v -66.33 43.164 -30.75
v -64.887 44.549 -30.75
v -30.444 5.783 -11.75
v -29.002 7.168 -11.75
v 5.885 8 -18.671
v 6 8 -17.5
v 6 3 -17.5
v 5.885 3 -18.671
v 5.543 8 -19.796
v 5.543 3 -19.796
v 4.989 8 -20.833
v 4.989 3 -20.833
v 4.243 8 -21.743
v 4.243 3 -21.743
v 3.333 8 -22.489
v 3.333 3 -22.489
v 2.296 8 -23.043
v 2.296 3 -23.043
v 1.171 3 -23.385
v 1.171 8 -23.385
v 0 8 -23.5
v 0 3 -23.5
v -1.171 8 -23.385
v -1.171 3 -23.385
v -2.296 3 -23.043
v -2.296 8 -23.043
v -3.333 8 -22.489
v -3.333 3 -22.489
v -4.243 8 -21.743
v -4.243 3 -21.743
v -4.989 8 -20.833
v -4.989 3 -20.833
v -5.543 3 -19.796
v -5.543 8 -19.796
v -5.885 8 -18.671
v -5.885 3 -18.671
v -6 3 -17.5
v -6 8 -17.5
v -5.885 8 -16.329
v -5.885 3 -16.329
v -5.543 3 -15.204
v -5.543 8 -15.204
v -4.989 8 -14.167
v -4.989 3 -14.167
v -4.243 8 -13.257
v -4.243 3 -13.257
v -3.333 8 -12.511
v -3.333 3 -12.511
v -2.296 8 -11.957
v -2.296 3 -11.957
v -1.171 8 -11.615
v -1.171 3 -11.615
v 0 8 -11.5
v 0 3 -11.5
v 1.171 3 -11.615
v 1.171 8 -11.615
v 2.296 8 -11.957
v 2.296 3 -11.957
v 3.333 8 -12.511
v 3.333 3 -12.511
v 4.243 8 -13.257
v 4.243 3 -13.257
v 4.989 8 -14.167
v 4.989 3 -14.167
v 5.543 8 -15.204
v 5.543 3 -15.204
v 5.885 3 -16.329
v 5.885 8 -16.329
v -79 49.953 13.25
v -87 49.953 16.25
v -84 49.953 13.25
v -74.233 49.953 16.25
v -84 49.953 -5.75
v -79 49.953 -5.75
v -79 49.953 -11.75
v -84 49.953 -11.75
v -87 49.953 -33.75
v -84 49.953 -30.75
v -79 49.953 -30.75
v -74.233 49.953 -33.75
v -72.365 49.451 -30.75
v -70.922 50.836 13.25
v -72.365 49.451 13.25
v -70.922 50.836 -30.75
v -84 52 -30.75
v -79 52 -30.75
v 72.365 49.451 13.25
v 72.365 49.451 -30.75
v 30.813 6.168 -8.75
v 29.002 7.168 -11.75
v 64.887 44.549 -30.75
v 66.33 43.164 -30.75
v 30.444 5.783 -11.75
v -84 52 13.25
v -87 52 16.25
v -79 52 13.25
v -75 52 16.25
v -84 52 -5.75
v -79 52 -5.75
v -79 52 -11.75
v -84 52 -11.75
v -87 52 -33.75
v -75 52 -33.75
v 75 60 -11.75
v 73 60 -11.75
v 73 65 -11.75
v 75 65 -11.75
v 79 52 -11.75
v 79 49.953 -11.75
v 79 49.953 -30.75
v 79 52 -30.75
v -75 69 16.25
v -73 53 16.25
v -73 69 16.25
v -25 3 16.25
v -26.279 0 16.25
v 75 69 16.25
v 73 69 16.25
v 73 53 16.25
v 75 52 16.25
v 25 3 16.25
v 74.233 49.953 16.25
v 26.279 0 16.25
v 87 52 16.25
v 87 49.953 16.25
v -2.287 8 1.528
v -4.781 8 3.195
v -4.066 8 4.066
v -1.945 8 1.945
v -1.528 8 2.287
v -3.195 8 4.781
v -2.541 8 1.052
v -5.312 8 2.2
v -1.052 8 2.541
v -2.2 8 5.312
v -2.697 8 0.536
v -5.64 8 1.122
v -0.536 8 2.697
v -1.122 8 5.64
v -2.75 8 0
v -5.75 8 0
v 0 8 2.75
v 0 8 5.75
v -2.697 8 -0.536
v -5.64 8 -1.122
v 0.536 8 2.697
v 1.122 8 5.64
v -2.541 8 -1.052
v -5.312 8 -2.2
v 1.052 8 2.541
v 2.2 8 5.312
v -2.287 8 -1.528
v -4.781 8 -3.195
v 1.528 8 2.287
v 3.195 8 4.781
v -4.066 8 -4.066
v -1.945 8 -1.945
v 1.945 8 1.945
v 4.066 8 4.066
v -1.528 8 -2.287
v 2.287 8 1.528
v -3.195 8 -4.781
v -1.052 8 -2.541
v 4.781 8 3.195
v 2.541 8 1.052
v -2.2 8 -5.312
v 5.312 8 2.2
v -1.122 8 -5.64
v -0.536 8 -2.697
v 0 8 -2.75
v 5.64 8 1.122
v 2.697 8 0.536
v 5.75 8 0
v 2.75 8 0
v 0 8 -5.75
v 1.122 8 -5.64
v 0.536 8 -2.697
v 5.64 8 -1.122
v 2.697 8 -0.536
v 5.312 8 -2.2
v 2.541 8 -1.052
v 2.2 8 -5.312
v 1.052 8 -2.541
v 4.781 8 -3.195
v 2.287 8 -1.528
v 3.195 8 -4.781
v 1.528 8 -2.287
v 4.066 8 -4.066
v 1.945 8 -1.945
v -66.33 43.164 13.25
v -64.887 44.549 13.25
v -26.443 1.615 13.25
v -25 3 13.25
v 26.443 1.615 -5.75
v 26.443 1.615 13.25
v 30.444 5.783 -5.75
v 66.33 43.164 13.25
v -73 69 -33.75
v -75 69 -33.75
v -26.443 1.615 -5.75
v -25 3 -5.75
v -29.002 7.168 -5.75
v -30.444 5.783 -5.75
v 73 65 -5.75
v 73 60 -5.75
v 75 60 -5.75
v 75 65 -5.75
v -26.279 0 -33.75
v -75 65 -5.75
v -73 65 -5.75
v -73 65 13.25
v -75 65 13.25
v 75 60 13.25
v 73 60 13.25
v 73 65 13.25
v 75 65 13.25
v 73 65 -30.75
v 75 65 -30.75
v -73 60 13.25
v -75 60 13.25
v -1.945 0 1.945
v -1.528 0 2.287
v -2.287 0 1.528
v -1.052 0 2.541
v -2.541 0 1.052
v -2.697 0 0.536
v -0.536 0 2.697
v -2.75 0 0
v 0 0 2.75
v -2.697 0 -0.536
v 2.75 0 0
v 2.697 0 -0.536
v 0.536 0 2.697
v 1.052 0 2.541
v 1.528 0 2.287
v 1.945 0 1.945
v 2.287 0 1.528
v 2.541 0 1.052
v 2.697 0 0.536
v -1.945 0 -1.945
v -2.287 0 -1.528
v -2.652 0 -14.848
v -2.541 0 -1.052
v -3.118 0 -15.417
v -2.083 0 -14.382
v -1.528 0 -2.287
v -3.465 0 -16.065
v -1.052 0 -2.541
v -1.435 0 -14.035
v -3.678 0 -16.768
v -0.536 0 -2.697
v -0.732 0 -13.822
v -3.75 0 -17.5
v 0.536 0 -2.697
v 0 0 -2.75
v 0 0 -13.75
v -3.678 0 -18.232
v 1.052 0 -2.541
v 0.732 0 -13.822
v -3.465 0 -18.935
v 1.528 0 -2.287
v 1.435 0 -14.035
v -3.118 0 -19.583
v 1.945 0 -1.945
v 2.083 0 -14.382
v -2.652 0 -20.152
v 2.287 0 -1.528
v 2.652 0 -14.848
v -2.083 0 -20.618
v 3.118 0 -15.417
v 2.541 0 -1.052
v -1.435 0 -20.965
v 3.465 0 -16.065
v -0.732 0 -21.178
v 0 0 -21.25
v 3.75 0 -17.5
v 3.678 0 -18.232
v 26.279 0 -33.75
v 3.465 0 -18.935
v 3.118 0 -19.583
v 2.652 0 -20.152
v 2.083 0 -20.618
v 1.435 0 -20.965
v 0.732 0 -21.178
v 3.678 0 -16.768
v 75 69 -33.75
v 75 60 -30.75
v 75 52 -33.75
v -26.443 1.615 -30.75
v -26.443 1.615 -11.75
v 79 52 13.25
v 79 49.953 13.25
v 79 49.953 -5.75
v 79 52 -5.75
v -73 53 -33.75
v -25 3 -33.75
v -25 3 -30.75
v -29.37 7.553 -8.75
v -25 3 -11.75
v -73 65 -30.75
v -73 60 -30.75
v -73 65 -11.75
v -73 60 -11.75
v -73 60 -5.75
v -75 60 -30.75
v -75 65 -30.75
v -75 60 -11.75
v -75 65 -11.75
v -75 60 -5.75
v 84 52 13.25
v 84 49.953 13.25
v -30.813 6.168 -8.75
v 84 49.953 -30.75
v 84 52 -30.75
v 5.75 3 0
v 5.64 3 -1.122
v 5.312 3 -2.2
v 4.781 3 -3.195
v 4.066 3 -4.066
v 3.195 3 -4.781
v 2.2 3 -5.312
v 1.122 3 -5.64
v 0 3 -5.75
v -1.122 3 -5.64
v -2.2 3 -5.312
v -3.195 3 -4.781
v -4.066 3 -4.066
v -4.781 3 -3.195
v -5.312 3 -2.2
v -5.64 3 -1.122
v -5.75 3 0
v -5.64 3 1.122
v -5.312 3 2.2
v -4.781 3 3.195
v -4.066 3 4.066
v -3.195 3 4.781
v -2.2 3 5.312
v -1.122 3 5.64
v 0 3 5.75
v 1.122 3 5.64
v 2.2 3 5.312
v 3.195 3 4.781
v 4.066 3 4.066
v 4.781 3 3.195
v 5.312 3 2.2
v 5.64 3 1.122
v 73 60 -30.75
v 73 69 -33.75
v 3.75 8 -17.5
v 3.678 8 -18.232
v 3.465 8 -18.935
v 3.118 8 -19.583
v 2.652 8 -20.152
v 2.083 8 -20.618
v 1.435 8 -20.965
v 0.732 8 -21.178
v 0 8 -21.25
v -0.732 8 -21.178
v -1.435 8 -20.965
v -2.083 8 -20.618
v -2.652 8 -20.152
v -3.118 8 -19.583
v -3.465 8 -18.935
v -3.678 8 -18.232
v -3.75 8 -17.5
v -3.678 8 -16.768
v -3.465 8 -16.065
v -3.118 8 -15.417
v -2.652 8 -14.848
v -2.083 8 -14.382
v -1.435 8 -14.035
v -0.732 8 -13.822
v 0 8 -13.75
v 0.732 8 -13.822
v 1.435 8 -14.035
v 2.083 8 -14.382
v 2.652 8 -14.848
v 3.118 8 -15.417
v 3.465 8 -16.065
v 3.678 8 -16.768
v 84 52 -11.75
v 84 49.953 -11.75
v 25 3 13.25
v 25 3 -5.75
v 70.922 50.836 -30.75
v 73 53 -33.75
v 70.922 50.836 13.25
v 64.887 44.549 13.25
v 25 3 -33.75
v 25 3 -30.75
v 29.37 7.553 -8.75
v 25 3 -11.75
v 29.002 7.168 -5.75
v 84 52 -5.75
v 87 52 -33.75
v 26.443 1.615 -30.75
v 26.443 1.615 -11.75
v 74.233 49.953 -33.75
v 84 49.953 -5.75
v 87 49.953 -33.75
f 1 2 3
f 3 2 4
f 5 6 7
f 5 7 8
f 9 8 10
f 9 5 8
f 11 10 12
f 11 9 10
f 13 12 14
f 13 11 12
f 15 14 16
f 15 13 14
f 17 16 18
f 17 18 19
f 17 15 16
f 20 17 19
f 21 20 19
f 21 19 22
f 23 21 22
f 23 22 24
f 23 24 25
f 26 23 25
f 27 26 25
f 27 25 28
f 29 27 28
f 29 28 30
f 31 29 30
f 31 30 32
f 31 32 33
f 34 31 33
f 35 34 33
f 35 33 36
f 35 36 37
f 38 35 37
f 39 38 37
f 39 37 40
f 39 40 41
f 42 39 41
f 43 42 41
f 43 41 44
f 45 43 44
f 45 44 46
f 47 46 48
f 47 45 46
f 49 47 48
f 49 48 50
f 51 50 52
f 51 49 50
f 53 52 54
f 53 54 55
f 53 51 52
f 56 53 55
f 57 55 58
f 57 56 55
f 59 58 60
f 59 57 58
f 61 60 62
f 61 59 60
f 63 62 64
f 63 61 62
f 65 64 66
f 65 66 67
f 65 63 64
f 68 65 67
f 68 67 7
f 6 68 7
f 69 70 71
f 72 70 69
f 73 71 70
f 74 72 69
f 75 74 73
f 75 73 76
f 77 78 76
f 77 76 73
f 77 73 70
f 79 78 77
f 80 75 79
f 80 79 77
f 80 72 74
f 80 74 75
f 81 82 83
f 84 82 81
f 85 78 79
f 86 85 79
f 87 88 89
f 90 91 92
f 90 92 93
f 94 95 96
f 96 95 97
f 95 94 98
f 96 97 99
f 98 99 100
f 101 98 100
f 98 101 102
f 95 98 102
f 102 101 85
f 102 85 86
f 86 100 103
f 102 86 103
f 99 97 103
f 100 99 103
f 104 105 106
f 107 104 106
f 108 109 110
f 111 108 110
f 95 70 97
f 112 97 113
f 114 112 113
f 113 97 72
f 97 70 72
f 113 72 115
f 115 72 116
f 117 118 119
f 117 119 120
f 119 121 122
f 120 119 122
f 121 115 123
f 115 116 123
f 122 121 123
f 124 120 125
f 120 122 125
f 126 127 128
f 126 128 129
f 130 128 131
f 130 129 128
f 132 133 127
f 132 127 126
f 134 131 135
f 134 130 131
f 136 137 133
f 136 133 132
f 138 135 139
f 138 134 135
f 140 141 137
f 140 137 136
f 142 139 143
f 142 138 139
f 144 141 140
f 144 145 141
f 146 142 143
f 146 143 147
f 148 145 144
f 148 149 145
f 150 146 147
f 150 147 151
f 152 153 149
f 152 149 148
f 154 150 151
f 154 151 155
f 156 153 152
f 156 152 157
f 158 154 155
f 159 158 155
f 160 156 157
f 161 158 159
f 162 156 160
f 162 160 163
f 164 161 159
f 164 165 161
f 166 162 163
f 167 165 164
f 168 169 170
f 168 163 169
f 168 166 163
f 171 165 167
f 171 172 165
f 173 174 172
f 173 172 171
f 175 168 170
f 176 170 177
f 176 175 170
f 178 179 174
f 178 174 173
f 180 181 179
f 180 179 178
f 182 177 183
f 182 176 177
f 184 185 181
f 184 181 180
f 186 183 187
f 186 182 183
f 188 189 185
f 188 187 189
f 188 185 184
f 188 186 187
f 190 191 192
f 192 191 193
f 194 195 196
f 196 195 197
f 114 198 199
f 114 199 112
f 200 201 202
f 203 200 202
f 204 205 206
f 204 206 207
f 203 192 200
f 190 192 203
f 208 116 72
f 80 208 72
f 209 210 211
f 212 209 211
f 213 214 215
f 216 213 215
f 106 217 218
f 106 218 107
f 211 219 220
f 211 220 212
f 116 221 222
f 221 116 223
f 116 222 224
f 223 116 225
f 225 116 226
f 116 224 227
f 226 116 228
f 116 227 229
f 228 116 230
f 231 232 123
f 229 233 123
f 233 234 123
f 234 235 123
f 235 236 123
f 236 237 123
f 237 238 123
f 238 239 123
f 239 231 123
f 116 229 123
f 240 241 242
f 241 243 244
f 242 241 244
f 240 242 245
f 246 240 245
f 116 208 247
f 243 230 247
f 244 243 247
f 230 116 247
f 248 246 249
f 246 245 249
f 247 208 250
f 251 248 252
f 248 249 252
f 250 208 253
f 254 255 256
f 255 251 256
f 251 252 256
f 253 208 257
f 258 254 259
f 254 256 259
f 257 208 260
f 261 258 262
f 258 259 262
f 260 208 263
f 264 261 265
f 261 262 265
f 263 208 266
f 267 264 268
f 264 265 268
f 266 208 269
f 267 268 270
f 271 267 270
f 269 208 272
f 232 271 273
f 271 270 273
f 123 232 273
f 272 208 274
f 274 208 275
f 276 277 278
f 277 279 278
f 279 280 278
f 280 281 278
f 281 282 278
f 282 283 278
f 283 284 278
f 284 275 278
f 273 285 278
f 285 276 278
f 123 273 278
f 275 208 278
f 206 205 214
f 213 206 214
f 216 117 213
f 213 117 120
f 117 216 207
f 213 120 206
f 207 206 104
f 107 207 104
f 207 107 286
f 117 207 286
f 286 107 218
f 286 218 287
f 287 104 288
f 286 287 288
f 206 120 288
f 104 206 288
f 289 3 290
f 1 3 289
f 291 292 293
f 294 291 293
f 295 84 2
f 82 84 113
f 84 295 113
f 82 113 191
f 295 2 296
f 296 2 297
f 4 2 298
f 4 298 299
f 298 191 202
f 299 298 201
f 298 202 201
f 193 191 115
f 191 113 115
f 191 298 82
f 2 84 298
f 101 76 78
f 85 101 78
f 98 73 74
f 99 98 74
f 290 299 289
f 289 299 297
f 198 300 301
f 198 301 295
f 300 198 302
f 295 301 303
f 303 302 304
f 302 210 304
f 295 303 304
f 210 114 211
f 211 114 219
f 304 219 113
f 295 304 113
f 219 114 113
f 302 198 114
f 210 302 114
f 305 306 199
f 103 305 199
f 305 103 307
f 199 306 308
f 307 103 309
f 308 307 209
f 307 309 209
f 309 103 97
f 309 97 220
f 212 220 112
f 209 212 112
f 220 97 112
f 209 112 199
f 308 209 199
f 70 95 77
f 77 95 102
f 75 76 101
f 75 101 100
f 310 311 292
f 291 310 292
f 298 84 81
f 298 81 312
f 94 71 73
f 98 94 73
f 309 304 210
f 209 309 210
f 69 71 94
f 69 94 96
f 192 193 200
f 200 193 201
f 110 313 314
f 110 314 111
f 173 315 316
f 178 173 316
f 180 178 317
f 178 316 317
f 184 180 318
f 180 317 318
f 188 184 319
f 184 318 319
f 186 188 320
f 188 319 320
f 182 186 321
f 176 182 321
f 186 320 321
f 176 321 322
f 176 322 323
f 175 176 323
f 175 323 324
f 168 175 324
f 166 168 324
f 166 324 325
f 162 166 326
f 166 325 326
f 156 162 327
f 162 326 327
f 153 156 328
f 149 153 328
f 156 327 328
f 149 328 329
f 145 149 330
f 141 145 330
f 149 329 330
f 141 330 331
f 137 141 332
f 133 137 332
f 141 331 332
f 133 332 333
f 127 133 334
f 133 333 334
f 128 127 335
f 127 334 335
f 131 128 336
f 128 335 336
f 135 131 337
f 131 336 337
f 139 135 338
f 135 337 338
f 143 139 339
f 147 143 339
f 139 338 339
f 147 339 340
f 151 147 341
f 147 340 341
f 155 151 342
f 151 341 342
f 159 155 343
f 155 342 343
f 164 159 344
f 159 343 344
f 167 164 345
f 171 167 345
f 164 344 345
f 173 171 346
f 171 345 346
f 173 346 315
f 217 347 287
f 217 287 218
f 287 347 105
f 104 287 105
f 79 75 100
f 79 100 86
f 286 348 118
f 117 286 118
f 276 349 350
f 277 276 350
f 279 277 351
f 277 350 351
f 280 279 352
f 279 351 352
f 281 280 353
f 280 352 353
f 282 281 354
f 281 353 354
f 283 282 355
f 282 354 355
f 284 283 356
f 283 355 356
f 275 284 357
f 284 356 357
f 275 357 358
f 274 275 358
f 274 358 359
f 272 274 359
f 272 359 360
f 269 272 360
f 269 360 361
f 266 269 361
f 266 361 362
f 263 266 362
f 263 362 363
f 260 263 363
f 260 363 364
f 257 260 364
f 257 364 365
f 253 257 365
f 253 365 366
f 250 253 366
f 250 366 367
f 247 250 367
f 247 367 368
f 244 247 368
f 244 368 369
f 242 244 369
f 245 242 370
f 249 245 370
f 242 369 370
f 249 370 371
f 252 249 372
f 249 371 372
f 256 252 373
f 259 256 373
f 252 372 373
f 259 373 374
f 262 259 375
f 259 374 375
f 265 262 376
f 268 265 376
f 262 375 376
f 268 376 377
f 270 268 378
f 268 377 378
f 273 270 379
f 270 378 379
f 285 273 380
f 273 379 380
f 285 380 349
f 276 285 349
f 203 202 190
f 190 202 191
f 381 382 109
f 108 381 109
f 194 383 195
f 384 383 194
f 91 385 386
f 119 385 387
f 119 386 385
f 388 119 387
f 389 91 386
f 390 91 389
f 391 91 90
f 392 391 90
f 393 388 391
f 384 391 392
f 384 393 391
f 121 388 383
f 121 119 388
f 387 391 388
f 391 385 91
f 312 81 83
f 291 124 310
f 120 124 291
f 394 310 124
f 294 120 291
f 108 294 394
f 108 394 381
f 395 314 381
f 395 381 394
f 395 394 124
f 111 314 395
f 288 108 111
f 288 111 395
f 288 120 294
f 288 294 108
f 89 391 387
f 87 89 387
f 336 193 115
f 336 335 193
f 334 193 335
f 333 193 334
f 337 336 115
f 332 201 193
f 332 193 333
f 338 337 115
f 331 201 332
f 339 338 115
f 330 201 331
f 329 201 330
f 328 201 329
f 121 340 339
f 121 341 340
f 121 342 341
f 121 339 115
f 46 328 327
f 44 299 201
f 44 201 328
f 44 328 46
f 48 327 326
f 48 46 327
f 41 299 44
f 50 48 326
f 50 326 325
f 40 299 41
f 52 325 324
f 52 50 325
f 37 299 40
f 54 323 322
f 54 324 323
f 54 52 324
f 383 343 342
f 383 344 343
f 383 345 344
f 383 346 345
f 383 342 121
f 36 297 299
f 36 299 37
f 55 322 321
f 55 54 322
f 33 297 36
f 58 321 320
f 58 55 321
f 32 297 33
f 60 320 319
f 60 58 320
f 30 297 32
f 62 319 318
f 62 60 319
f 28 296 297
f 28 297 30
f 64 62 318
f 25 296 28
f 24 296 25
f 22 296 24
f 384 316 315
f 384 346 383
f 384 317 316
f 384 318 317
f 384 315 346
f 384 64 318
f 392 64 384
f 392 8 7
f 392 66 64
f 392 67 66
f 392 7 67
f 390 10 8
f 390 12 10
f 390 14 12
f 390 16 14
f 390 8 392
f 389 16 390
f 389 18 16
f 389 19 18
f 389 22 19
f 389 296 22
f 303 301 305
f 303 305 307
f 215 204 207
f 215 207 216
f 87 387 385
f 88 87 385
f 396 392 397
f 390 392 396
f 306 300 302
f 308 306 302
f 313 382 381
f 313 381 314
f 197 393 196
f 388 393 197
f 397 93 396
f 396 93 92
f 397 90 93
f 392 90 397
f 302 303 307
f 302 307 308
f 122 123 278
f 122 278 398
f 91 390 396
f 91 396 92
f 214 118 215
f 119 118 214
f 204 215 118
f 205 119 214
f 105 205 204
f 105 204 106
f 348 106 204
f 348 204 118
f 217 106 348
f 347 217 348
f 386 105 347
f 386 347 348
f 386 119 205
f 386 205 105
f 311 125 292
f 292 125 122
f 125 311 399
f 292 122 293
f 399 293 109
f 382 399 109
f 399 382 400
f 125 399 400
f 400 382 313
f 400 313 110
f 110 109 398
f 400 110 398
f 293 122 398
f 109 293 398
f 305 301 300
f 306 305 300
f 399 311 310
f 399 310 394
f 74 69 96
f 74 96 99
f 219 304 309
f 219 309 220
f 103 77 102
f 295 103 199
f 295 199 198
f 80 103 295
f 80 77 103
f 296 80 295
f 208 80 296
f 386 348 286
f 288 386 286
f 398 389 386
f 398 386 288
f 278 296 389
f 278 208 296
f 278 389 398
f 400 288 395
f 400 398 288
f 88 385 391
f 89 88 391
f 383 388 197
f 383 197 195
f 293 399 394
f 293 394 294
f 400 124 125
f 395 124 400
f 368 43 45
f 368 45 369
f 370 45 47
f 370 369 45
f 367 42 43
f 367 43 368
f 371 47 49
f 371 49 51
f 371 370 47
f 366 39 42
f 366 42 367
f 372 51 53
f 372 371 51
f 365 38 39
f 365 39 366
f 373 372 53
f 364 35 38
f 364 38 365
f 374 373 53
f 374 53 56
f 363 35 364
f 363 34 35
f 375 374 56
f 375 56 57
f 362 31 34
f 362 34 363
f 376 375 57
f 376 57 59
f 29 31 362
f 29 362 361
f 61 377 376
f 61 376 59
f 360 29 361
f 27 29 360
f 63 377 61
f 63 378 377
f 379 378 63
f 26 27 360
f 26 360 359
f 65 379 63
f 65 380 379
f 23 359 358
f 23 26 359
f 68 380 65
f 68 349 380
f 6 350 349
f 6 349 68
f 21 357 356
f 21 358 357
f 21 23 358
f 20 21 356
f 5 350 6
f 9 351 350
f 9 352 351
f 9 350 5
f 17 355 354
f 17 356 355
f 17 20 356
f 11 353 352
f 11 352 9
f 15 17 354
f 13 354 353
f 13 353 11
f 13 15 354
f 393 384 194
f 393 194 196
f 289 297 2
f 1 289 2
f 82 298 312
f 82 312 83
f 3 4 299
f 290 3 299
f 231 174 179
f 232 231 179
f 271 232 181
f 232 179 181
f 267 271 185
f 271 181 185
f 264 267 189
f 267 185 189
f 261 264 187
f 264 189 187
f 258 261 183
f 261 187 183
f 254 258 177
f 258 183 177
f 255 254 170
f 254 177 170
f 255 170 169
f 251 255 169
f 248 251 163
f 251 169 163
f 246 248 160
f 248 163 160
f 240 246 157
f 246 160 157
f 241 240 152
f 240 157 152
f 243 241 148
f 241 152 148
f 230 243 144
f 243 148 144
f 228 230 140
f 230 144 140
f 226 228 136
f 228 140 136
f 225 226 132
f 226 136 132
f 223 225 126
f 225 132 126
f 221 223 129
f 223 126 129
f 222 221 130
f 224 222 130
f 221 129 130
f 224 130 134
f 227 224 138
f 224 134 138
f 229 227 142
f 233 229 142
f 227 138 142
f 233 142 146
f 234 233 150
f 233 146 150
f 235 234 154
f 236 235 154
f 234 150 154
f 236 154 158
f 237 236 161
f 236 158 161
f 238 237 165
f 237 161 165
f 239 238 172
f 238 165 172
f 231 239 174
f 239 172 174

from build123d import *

# Parameters (mm, degrees)
SKETCH1_W               = 50
SKETCH1_H               = 50
SKETCH1_R               = 3.75
SKETCH1_R_2             = 2.75
BOSS_EXTRUDE1_DEPTH     = 3
BOSS_EXTRUDE2_DEPTH     = 50
CUT_EXTRUDE2_DEPTH      = 2
SKETCH10_W              = 50
SKETCH10_H              = 2.047418662
BOSS_EXTRUDE6_DEPTH     = 2
SKETCH11_W              = 5
SKETCH11_H              = 19
CUT_EXTRUDE4_DEPTH      = 4
SKETCH12_W              = 2
SKETCH12_H              = 50
BOSS_EXTRUDE7_DEPTH     = 10
SKETCH13_W              = 19
SKETCH13_H              = 5
CUT_EXTRUDE5_DEPTH      = 10
SKETCH14_R              = 5.75
SKETCH14_R_2            = 3.75
SKETCH14_R_3            = 4.75
SKETCH14_R_4            = 2.75
BOSS_EXTRUDE8_DEPTH     = 5
SKETCH15_W              = 50
SKETCH15_H              = 3
CUT_EXTRUDE6_DEPTH      = 161
CUT_EXTRUDE6_DEPTH_BACK = 15
SKETCH16_R              = 3.75
SKETCH16_R_2            = 2.75
BOSS_EXTRUDE9_DEPTH     = 8
SKETCH17_R              = 3.75
CUT_EXTRUDE7_DEPTH      = 9
SKETCH18_R              = 6
SKETCH18_R_2            = 4.75
BOSS_EXTRUDE10_DEPTH    = 8


with BuildPart() as part:
    # Sketch1 → Boss-Extrude1 (new body)
    with BuildSketch(Plane(origin=(0, 0, 0), x_dir=(1, 0, 0), z_dir=(0, 1, 0))):
        with Locations((0, 8.75)):
            Rectangle(SKETCH1_W, SKETCH1_H)
        Circle(SKETCH1_R, mode=Mode.SUBTRACT)
        with Locations((0, 17.5)):
            Circle(SKETCH1_R_2, mode=Mode.SUBTRACT)
    extrude(amount=BOSS_EXTRUDE1_DEPTH)

    # Sketch2 → Boss-Extrude2 (add)
    with BuildSketch(Plane.XY.offset(16.25)):
        Polygon((-25, 0), (-26.278653628, 0), (-74.233131713, 49.952581338), (-85, 49.952581338), (-85, 52), (-75, 52), (-75, 62), (-73, 62), (-73, 53), (-25, 3), align=None)
    boss_extrude2 = extrude(amount=-BOSS_EXTRUDE2_DEPTH)

    # Sketch3 → Cut-Extrude2 (cut)
    with BuildSketch(Plane(origin=(-11.511240633, -11.050791007, 0), x_dir=(0, 0, -1), z_dir=(0.721387321, 0.692531828, 0))):
        Polygon((-13.25, 85.788351472), (30.75, 85.788351472), (8.75, 25.788351472), align=None)
        Polygon((30.75, 77.073872213), (11.75, 25.255690395), (11.75, 19.477457668), (30.75, 19.477457668), (30.75, 22.897932802), align=None)
        Polygon((-13.25, 77.073872213), (-13.25, 19.477457668), (5.75, 19.477457668), (5.75, 25.255690395), align=None)
    cut_extrude2 = extrude(amount=-CUT_EXTRUDE2_DEPTH, mode=Mode.SUBTRACT)

    # Mirror1: Boss-Extrude2, Cut-Extrude2 across plane
    add(boss_extrude2.mirror(Plane(origin=(0, 0, 0), x_dir=(0, 0, 1), z_dir=(1, 0, 0))))
    add(cut_extrude2.mirror(Plane(origin=(0, 0, 0), x_dir=(0, 0, 1), z_dir=(1, 0, 0))), mode=Mode.SUBTRACT)

    # Sketch10 → Boss-Extrude6 (add)
    with BuildSketch(Plane(origin=(85, 0, 0), x_dir=(0, 0, -1), z_dir=(1, 0, 0))):
        with Locations((8.75, 50.976290669)):
            Rectangle(SKETCH10_W, SKETCH10_H)
    boss_extrude6 = extrude(amount=BOSS_EXTRUDE6_DEPTH)

    # Sketch11 → Cut-Extrude4 (cut)
    with BuildSketch(Plane(origin=(0, 49.952581338, 0), x_dir=(-1, 0, 0), z_dir=(0, -1, 0))):
        with Locations((-81.5, -3.75)):
            Rectangle(SKETCH11_W, SKETCH11_H)
        with Locations((-81.5, 21.25)):
            Rectangle(SKETCH11_W, SKETCH11_H)
    cut_extrude4 = extrude(amount=-CUT_EXTRUDE4_DEPTH, mode=Mode.SUBTRACT)

    # Mirror2: Boss-Extrude6, Cut-Extrude4 across plane
    add(boss_extrude6.mirror(Plane(origin=(0, 0, 0), x_dir=(0, 0, 1), z_dir=(1, 0, 0))))
    add(cut_extrude4.mirror(Plane(origin=(0, 0, 0), x_dir=(0, 0, 1), z_dir=(1, 0, 0))), mode=Mode.SUBTRACT)

    # Sketch12 → Boss-Extrude7 (add)
    with BuildSketch(Plane(origin=(0, 62, 0), x_dir=(1, 0, 0), z_dir=(0, 1, 0))):
        with Locations((74, 8.75)):
            Rectangle(SKETCH12_W, SKETCH12_H)
        with Locations((-74, 8.75)):
            Rectangle(SKETCH12_W, SKETCH12_H)
    extrude(amount=BOSS_EXTRUDE7_DEPTH)

    # Sketch13 → Cut-Extrude5 (cut)
    with BuildSketch(Plane.ZY.offset(-73)):
        with Locations((-21.25, 62.5)):
            Rectangle(SKETCH13_W, SKETCH13_H)
        with Locations((3.75, 62.5)):
            Rectangle(SKETCH13_W, SKETCH13_H)
    cut_extrude5 = extrude(amount=-CUT_EXTRUDE5_DEPTH, mode=Mode.SUBTRACT)

    # Mirror3: Cut-Extrude5 across plane
    add(cut_extrude5.mirror(Plane(origin=(0, 0, 0), x_dir=(0, 0, 1), z_dir=(1, 0, 0))), mode=Mode.SUBTRACT)

    # Sketch14 → Boss-Extrude8 (add)
    with BuildSketch(Plane(origin=(0, 3, 0), x_dir=(1, 0, 0), z_dir=(0, 1, 0))):
        Circle(SKETCH14_R)
        Circle(SKETCH14_R_2, mode=Mode.SUBTRACT)
        with Locations((0, 17.5)):
            Circle(SKETCH14_R_3)
        with Locations((0, 17.5)):
            Circle(SKETCH14_R_4, mode=Mode.SUBTRACT)
    extrude(amount=BOSS_EXTRUDE8_DEPTH)

    # Sketch15 → Cut-Extrude6 (cut, two sides)
    with BuildSketch(Plane.ZY.offset(-73)) as cut_extrude6_sk:
        with Locations((-8.75, 70.5)):
            Rectangle(SKETCH15_W, SKETCH15_H)
    extrude(amount=CUT_EXTRUDE6_DEPTH, mode=Mode.SUBTRACT)
    extrude(cut_extrude6_sk.sketch, amount=-CUT_EXTRUDE6_DEPTH_BACK, mode=Mode.SUBTRACT)

    # Sketch16 → Boss-Extrude9 (add)
    with BuildSketch(Plane(origin=(0, 8, 0), x_dir=(1, 0, 0), z_dir=(0, 1, 0))):
        Circle(SKETCH16_R)
        Circle(SKETCH16_R_2, mode=Mode.SUBTRACT)
    extrude(amount=-BOSS_EXTRUDE9_DEPTH)

    # Sketch17 → Cut-Extrude7 (cut, through all)
    with BuildSketch(Plane(origin=(0, 8, 0), x_dir=(1, 0, 0), z_dir=(0, 1, 0))):
        with Locations((0, 17.5)):
            Circle(SKETCH17_R)
    extrude(amount=-CUT_EXTRUDE7_DEPTH, mode=Mode.SUBTRACT)

    # Sketch18 → Boss-Extrude10 (add)
    with BuildSketch(Plane(origin=(0, 8, 0), x_dir=(1, 0, 0), z_dir=(0, 1, 0))):
        with Locations((0, 17.5)):
            Circle(SKETCH18_R)
        with Locations((0, 17.5)):
            Circle(SKETCH18_R_2, mode=Mode.SUBTRACT)
    extrude(amount=-BOSS_EXTRUDE10_DEPTH)


solid = part.part
